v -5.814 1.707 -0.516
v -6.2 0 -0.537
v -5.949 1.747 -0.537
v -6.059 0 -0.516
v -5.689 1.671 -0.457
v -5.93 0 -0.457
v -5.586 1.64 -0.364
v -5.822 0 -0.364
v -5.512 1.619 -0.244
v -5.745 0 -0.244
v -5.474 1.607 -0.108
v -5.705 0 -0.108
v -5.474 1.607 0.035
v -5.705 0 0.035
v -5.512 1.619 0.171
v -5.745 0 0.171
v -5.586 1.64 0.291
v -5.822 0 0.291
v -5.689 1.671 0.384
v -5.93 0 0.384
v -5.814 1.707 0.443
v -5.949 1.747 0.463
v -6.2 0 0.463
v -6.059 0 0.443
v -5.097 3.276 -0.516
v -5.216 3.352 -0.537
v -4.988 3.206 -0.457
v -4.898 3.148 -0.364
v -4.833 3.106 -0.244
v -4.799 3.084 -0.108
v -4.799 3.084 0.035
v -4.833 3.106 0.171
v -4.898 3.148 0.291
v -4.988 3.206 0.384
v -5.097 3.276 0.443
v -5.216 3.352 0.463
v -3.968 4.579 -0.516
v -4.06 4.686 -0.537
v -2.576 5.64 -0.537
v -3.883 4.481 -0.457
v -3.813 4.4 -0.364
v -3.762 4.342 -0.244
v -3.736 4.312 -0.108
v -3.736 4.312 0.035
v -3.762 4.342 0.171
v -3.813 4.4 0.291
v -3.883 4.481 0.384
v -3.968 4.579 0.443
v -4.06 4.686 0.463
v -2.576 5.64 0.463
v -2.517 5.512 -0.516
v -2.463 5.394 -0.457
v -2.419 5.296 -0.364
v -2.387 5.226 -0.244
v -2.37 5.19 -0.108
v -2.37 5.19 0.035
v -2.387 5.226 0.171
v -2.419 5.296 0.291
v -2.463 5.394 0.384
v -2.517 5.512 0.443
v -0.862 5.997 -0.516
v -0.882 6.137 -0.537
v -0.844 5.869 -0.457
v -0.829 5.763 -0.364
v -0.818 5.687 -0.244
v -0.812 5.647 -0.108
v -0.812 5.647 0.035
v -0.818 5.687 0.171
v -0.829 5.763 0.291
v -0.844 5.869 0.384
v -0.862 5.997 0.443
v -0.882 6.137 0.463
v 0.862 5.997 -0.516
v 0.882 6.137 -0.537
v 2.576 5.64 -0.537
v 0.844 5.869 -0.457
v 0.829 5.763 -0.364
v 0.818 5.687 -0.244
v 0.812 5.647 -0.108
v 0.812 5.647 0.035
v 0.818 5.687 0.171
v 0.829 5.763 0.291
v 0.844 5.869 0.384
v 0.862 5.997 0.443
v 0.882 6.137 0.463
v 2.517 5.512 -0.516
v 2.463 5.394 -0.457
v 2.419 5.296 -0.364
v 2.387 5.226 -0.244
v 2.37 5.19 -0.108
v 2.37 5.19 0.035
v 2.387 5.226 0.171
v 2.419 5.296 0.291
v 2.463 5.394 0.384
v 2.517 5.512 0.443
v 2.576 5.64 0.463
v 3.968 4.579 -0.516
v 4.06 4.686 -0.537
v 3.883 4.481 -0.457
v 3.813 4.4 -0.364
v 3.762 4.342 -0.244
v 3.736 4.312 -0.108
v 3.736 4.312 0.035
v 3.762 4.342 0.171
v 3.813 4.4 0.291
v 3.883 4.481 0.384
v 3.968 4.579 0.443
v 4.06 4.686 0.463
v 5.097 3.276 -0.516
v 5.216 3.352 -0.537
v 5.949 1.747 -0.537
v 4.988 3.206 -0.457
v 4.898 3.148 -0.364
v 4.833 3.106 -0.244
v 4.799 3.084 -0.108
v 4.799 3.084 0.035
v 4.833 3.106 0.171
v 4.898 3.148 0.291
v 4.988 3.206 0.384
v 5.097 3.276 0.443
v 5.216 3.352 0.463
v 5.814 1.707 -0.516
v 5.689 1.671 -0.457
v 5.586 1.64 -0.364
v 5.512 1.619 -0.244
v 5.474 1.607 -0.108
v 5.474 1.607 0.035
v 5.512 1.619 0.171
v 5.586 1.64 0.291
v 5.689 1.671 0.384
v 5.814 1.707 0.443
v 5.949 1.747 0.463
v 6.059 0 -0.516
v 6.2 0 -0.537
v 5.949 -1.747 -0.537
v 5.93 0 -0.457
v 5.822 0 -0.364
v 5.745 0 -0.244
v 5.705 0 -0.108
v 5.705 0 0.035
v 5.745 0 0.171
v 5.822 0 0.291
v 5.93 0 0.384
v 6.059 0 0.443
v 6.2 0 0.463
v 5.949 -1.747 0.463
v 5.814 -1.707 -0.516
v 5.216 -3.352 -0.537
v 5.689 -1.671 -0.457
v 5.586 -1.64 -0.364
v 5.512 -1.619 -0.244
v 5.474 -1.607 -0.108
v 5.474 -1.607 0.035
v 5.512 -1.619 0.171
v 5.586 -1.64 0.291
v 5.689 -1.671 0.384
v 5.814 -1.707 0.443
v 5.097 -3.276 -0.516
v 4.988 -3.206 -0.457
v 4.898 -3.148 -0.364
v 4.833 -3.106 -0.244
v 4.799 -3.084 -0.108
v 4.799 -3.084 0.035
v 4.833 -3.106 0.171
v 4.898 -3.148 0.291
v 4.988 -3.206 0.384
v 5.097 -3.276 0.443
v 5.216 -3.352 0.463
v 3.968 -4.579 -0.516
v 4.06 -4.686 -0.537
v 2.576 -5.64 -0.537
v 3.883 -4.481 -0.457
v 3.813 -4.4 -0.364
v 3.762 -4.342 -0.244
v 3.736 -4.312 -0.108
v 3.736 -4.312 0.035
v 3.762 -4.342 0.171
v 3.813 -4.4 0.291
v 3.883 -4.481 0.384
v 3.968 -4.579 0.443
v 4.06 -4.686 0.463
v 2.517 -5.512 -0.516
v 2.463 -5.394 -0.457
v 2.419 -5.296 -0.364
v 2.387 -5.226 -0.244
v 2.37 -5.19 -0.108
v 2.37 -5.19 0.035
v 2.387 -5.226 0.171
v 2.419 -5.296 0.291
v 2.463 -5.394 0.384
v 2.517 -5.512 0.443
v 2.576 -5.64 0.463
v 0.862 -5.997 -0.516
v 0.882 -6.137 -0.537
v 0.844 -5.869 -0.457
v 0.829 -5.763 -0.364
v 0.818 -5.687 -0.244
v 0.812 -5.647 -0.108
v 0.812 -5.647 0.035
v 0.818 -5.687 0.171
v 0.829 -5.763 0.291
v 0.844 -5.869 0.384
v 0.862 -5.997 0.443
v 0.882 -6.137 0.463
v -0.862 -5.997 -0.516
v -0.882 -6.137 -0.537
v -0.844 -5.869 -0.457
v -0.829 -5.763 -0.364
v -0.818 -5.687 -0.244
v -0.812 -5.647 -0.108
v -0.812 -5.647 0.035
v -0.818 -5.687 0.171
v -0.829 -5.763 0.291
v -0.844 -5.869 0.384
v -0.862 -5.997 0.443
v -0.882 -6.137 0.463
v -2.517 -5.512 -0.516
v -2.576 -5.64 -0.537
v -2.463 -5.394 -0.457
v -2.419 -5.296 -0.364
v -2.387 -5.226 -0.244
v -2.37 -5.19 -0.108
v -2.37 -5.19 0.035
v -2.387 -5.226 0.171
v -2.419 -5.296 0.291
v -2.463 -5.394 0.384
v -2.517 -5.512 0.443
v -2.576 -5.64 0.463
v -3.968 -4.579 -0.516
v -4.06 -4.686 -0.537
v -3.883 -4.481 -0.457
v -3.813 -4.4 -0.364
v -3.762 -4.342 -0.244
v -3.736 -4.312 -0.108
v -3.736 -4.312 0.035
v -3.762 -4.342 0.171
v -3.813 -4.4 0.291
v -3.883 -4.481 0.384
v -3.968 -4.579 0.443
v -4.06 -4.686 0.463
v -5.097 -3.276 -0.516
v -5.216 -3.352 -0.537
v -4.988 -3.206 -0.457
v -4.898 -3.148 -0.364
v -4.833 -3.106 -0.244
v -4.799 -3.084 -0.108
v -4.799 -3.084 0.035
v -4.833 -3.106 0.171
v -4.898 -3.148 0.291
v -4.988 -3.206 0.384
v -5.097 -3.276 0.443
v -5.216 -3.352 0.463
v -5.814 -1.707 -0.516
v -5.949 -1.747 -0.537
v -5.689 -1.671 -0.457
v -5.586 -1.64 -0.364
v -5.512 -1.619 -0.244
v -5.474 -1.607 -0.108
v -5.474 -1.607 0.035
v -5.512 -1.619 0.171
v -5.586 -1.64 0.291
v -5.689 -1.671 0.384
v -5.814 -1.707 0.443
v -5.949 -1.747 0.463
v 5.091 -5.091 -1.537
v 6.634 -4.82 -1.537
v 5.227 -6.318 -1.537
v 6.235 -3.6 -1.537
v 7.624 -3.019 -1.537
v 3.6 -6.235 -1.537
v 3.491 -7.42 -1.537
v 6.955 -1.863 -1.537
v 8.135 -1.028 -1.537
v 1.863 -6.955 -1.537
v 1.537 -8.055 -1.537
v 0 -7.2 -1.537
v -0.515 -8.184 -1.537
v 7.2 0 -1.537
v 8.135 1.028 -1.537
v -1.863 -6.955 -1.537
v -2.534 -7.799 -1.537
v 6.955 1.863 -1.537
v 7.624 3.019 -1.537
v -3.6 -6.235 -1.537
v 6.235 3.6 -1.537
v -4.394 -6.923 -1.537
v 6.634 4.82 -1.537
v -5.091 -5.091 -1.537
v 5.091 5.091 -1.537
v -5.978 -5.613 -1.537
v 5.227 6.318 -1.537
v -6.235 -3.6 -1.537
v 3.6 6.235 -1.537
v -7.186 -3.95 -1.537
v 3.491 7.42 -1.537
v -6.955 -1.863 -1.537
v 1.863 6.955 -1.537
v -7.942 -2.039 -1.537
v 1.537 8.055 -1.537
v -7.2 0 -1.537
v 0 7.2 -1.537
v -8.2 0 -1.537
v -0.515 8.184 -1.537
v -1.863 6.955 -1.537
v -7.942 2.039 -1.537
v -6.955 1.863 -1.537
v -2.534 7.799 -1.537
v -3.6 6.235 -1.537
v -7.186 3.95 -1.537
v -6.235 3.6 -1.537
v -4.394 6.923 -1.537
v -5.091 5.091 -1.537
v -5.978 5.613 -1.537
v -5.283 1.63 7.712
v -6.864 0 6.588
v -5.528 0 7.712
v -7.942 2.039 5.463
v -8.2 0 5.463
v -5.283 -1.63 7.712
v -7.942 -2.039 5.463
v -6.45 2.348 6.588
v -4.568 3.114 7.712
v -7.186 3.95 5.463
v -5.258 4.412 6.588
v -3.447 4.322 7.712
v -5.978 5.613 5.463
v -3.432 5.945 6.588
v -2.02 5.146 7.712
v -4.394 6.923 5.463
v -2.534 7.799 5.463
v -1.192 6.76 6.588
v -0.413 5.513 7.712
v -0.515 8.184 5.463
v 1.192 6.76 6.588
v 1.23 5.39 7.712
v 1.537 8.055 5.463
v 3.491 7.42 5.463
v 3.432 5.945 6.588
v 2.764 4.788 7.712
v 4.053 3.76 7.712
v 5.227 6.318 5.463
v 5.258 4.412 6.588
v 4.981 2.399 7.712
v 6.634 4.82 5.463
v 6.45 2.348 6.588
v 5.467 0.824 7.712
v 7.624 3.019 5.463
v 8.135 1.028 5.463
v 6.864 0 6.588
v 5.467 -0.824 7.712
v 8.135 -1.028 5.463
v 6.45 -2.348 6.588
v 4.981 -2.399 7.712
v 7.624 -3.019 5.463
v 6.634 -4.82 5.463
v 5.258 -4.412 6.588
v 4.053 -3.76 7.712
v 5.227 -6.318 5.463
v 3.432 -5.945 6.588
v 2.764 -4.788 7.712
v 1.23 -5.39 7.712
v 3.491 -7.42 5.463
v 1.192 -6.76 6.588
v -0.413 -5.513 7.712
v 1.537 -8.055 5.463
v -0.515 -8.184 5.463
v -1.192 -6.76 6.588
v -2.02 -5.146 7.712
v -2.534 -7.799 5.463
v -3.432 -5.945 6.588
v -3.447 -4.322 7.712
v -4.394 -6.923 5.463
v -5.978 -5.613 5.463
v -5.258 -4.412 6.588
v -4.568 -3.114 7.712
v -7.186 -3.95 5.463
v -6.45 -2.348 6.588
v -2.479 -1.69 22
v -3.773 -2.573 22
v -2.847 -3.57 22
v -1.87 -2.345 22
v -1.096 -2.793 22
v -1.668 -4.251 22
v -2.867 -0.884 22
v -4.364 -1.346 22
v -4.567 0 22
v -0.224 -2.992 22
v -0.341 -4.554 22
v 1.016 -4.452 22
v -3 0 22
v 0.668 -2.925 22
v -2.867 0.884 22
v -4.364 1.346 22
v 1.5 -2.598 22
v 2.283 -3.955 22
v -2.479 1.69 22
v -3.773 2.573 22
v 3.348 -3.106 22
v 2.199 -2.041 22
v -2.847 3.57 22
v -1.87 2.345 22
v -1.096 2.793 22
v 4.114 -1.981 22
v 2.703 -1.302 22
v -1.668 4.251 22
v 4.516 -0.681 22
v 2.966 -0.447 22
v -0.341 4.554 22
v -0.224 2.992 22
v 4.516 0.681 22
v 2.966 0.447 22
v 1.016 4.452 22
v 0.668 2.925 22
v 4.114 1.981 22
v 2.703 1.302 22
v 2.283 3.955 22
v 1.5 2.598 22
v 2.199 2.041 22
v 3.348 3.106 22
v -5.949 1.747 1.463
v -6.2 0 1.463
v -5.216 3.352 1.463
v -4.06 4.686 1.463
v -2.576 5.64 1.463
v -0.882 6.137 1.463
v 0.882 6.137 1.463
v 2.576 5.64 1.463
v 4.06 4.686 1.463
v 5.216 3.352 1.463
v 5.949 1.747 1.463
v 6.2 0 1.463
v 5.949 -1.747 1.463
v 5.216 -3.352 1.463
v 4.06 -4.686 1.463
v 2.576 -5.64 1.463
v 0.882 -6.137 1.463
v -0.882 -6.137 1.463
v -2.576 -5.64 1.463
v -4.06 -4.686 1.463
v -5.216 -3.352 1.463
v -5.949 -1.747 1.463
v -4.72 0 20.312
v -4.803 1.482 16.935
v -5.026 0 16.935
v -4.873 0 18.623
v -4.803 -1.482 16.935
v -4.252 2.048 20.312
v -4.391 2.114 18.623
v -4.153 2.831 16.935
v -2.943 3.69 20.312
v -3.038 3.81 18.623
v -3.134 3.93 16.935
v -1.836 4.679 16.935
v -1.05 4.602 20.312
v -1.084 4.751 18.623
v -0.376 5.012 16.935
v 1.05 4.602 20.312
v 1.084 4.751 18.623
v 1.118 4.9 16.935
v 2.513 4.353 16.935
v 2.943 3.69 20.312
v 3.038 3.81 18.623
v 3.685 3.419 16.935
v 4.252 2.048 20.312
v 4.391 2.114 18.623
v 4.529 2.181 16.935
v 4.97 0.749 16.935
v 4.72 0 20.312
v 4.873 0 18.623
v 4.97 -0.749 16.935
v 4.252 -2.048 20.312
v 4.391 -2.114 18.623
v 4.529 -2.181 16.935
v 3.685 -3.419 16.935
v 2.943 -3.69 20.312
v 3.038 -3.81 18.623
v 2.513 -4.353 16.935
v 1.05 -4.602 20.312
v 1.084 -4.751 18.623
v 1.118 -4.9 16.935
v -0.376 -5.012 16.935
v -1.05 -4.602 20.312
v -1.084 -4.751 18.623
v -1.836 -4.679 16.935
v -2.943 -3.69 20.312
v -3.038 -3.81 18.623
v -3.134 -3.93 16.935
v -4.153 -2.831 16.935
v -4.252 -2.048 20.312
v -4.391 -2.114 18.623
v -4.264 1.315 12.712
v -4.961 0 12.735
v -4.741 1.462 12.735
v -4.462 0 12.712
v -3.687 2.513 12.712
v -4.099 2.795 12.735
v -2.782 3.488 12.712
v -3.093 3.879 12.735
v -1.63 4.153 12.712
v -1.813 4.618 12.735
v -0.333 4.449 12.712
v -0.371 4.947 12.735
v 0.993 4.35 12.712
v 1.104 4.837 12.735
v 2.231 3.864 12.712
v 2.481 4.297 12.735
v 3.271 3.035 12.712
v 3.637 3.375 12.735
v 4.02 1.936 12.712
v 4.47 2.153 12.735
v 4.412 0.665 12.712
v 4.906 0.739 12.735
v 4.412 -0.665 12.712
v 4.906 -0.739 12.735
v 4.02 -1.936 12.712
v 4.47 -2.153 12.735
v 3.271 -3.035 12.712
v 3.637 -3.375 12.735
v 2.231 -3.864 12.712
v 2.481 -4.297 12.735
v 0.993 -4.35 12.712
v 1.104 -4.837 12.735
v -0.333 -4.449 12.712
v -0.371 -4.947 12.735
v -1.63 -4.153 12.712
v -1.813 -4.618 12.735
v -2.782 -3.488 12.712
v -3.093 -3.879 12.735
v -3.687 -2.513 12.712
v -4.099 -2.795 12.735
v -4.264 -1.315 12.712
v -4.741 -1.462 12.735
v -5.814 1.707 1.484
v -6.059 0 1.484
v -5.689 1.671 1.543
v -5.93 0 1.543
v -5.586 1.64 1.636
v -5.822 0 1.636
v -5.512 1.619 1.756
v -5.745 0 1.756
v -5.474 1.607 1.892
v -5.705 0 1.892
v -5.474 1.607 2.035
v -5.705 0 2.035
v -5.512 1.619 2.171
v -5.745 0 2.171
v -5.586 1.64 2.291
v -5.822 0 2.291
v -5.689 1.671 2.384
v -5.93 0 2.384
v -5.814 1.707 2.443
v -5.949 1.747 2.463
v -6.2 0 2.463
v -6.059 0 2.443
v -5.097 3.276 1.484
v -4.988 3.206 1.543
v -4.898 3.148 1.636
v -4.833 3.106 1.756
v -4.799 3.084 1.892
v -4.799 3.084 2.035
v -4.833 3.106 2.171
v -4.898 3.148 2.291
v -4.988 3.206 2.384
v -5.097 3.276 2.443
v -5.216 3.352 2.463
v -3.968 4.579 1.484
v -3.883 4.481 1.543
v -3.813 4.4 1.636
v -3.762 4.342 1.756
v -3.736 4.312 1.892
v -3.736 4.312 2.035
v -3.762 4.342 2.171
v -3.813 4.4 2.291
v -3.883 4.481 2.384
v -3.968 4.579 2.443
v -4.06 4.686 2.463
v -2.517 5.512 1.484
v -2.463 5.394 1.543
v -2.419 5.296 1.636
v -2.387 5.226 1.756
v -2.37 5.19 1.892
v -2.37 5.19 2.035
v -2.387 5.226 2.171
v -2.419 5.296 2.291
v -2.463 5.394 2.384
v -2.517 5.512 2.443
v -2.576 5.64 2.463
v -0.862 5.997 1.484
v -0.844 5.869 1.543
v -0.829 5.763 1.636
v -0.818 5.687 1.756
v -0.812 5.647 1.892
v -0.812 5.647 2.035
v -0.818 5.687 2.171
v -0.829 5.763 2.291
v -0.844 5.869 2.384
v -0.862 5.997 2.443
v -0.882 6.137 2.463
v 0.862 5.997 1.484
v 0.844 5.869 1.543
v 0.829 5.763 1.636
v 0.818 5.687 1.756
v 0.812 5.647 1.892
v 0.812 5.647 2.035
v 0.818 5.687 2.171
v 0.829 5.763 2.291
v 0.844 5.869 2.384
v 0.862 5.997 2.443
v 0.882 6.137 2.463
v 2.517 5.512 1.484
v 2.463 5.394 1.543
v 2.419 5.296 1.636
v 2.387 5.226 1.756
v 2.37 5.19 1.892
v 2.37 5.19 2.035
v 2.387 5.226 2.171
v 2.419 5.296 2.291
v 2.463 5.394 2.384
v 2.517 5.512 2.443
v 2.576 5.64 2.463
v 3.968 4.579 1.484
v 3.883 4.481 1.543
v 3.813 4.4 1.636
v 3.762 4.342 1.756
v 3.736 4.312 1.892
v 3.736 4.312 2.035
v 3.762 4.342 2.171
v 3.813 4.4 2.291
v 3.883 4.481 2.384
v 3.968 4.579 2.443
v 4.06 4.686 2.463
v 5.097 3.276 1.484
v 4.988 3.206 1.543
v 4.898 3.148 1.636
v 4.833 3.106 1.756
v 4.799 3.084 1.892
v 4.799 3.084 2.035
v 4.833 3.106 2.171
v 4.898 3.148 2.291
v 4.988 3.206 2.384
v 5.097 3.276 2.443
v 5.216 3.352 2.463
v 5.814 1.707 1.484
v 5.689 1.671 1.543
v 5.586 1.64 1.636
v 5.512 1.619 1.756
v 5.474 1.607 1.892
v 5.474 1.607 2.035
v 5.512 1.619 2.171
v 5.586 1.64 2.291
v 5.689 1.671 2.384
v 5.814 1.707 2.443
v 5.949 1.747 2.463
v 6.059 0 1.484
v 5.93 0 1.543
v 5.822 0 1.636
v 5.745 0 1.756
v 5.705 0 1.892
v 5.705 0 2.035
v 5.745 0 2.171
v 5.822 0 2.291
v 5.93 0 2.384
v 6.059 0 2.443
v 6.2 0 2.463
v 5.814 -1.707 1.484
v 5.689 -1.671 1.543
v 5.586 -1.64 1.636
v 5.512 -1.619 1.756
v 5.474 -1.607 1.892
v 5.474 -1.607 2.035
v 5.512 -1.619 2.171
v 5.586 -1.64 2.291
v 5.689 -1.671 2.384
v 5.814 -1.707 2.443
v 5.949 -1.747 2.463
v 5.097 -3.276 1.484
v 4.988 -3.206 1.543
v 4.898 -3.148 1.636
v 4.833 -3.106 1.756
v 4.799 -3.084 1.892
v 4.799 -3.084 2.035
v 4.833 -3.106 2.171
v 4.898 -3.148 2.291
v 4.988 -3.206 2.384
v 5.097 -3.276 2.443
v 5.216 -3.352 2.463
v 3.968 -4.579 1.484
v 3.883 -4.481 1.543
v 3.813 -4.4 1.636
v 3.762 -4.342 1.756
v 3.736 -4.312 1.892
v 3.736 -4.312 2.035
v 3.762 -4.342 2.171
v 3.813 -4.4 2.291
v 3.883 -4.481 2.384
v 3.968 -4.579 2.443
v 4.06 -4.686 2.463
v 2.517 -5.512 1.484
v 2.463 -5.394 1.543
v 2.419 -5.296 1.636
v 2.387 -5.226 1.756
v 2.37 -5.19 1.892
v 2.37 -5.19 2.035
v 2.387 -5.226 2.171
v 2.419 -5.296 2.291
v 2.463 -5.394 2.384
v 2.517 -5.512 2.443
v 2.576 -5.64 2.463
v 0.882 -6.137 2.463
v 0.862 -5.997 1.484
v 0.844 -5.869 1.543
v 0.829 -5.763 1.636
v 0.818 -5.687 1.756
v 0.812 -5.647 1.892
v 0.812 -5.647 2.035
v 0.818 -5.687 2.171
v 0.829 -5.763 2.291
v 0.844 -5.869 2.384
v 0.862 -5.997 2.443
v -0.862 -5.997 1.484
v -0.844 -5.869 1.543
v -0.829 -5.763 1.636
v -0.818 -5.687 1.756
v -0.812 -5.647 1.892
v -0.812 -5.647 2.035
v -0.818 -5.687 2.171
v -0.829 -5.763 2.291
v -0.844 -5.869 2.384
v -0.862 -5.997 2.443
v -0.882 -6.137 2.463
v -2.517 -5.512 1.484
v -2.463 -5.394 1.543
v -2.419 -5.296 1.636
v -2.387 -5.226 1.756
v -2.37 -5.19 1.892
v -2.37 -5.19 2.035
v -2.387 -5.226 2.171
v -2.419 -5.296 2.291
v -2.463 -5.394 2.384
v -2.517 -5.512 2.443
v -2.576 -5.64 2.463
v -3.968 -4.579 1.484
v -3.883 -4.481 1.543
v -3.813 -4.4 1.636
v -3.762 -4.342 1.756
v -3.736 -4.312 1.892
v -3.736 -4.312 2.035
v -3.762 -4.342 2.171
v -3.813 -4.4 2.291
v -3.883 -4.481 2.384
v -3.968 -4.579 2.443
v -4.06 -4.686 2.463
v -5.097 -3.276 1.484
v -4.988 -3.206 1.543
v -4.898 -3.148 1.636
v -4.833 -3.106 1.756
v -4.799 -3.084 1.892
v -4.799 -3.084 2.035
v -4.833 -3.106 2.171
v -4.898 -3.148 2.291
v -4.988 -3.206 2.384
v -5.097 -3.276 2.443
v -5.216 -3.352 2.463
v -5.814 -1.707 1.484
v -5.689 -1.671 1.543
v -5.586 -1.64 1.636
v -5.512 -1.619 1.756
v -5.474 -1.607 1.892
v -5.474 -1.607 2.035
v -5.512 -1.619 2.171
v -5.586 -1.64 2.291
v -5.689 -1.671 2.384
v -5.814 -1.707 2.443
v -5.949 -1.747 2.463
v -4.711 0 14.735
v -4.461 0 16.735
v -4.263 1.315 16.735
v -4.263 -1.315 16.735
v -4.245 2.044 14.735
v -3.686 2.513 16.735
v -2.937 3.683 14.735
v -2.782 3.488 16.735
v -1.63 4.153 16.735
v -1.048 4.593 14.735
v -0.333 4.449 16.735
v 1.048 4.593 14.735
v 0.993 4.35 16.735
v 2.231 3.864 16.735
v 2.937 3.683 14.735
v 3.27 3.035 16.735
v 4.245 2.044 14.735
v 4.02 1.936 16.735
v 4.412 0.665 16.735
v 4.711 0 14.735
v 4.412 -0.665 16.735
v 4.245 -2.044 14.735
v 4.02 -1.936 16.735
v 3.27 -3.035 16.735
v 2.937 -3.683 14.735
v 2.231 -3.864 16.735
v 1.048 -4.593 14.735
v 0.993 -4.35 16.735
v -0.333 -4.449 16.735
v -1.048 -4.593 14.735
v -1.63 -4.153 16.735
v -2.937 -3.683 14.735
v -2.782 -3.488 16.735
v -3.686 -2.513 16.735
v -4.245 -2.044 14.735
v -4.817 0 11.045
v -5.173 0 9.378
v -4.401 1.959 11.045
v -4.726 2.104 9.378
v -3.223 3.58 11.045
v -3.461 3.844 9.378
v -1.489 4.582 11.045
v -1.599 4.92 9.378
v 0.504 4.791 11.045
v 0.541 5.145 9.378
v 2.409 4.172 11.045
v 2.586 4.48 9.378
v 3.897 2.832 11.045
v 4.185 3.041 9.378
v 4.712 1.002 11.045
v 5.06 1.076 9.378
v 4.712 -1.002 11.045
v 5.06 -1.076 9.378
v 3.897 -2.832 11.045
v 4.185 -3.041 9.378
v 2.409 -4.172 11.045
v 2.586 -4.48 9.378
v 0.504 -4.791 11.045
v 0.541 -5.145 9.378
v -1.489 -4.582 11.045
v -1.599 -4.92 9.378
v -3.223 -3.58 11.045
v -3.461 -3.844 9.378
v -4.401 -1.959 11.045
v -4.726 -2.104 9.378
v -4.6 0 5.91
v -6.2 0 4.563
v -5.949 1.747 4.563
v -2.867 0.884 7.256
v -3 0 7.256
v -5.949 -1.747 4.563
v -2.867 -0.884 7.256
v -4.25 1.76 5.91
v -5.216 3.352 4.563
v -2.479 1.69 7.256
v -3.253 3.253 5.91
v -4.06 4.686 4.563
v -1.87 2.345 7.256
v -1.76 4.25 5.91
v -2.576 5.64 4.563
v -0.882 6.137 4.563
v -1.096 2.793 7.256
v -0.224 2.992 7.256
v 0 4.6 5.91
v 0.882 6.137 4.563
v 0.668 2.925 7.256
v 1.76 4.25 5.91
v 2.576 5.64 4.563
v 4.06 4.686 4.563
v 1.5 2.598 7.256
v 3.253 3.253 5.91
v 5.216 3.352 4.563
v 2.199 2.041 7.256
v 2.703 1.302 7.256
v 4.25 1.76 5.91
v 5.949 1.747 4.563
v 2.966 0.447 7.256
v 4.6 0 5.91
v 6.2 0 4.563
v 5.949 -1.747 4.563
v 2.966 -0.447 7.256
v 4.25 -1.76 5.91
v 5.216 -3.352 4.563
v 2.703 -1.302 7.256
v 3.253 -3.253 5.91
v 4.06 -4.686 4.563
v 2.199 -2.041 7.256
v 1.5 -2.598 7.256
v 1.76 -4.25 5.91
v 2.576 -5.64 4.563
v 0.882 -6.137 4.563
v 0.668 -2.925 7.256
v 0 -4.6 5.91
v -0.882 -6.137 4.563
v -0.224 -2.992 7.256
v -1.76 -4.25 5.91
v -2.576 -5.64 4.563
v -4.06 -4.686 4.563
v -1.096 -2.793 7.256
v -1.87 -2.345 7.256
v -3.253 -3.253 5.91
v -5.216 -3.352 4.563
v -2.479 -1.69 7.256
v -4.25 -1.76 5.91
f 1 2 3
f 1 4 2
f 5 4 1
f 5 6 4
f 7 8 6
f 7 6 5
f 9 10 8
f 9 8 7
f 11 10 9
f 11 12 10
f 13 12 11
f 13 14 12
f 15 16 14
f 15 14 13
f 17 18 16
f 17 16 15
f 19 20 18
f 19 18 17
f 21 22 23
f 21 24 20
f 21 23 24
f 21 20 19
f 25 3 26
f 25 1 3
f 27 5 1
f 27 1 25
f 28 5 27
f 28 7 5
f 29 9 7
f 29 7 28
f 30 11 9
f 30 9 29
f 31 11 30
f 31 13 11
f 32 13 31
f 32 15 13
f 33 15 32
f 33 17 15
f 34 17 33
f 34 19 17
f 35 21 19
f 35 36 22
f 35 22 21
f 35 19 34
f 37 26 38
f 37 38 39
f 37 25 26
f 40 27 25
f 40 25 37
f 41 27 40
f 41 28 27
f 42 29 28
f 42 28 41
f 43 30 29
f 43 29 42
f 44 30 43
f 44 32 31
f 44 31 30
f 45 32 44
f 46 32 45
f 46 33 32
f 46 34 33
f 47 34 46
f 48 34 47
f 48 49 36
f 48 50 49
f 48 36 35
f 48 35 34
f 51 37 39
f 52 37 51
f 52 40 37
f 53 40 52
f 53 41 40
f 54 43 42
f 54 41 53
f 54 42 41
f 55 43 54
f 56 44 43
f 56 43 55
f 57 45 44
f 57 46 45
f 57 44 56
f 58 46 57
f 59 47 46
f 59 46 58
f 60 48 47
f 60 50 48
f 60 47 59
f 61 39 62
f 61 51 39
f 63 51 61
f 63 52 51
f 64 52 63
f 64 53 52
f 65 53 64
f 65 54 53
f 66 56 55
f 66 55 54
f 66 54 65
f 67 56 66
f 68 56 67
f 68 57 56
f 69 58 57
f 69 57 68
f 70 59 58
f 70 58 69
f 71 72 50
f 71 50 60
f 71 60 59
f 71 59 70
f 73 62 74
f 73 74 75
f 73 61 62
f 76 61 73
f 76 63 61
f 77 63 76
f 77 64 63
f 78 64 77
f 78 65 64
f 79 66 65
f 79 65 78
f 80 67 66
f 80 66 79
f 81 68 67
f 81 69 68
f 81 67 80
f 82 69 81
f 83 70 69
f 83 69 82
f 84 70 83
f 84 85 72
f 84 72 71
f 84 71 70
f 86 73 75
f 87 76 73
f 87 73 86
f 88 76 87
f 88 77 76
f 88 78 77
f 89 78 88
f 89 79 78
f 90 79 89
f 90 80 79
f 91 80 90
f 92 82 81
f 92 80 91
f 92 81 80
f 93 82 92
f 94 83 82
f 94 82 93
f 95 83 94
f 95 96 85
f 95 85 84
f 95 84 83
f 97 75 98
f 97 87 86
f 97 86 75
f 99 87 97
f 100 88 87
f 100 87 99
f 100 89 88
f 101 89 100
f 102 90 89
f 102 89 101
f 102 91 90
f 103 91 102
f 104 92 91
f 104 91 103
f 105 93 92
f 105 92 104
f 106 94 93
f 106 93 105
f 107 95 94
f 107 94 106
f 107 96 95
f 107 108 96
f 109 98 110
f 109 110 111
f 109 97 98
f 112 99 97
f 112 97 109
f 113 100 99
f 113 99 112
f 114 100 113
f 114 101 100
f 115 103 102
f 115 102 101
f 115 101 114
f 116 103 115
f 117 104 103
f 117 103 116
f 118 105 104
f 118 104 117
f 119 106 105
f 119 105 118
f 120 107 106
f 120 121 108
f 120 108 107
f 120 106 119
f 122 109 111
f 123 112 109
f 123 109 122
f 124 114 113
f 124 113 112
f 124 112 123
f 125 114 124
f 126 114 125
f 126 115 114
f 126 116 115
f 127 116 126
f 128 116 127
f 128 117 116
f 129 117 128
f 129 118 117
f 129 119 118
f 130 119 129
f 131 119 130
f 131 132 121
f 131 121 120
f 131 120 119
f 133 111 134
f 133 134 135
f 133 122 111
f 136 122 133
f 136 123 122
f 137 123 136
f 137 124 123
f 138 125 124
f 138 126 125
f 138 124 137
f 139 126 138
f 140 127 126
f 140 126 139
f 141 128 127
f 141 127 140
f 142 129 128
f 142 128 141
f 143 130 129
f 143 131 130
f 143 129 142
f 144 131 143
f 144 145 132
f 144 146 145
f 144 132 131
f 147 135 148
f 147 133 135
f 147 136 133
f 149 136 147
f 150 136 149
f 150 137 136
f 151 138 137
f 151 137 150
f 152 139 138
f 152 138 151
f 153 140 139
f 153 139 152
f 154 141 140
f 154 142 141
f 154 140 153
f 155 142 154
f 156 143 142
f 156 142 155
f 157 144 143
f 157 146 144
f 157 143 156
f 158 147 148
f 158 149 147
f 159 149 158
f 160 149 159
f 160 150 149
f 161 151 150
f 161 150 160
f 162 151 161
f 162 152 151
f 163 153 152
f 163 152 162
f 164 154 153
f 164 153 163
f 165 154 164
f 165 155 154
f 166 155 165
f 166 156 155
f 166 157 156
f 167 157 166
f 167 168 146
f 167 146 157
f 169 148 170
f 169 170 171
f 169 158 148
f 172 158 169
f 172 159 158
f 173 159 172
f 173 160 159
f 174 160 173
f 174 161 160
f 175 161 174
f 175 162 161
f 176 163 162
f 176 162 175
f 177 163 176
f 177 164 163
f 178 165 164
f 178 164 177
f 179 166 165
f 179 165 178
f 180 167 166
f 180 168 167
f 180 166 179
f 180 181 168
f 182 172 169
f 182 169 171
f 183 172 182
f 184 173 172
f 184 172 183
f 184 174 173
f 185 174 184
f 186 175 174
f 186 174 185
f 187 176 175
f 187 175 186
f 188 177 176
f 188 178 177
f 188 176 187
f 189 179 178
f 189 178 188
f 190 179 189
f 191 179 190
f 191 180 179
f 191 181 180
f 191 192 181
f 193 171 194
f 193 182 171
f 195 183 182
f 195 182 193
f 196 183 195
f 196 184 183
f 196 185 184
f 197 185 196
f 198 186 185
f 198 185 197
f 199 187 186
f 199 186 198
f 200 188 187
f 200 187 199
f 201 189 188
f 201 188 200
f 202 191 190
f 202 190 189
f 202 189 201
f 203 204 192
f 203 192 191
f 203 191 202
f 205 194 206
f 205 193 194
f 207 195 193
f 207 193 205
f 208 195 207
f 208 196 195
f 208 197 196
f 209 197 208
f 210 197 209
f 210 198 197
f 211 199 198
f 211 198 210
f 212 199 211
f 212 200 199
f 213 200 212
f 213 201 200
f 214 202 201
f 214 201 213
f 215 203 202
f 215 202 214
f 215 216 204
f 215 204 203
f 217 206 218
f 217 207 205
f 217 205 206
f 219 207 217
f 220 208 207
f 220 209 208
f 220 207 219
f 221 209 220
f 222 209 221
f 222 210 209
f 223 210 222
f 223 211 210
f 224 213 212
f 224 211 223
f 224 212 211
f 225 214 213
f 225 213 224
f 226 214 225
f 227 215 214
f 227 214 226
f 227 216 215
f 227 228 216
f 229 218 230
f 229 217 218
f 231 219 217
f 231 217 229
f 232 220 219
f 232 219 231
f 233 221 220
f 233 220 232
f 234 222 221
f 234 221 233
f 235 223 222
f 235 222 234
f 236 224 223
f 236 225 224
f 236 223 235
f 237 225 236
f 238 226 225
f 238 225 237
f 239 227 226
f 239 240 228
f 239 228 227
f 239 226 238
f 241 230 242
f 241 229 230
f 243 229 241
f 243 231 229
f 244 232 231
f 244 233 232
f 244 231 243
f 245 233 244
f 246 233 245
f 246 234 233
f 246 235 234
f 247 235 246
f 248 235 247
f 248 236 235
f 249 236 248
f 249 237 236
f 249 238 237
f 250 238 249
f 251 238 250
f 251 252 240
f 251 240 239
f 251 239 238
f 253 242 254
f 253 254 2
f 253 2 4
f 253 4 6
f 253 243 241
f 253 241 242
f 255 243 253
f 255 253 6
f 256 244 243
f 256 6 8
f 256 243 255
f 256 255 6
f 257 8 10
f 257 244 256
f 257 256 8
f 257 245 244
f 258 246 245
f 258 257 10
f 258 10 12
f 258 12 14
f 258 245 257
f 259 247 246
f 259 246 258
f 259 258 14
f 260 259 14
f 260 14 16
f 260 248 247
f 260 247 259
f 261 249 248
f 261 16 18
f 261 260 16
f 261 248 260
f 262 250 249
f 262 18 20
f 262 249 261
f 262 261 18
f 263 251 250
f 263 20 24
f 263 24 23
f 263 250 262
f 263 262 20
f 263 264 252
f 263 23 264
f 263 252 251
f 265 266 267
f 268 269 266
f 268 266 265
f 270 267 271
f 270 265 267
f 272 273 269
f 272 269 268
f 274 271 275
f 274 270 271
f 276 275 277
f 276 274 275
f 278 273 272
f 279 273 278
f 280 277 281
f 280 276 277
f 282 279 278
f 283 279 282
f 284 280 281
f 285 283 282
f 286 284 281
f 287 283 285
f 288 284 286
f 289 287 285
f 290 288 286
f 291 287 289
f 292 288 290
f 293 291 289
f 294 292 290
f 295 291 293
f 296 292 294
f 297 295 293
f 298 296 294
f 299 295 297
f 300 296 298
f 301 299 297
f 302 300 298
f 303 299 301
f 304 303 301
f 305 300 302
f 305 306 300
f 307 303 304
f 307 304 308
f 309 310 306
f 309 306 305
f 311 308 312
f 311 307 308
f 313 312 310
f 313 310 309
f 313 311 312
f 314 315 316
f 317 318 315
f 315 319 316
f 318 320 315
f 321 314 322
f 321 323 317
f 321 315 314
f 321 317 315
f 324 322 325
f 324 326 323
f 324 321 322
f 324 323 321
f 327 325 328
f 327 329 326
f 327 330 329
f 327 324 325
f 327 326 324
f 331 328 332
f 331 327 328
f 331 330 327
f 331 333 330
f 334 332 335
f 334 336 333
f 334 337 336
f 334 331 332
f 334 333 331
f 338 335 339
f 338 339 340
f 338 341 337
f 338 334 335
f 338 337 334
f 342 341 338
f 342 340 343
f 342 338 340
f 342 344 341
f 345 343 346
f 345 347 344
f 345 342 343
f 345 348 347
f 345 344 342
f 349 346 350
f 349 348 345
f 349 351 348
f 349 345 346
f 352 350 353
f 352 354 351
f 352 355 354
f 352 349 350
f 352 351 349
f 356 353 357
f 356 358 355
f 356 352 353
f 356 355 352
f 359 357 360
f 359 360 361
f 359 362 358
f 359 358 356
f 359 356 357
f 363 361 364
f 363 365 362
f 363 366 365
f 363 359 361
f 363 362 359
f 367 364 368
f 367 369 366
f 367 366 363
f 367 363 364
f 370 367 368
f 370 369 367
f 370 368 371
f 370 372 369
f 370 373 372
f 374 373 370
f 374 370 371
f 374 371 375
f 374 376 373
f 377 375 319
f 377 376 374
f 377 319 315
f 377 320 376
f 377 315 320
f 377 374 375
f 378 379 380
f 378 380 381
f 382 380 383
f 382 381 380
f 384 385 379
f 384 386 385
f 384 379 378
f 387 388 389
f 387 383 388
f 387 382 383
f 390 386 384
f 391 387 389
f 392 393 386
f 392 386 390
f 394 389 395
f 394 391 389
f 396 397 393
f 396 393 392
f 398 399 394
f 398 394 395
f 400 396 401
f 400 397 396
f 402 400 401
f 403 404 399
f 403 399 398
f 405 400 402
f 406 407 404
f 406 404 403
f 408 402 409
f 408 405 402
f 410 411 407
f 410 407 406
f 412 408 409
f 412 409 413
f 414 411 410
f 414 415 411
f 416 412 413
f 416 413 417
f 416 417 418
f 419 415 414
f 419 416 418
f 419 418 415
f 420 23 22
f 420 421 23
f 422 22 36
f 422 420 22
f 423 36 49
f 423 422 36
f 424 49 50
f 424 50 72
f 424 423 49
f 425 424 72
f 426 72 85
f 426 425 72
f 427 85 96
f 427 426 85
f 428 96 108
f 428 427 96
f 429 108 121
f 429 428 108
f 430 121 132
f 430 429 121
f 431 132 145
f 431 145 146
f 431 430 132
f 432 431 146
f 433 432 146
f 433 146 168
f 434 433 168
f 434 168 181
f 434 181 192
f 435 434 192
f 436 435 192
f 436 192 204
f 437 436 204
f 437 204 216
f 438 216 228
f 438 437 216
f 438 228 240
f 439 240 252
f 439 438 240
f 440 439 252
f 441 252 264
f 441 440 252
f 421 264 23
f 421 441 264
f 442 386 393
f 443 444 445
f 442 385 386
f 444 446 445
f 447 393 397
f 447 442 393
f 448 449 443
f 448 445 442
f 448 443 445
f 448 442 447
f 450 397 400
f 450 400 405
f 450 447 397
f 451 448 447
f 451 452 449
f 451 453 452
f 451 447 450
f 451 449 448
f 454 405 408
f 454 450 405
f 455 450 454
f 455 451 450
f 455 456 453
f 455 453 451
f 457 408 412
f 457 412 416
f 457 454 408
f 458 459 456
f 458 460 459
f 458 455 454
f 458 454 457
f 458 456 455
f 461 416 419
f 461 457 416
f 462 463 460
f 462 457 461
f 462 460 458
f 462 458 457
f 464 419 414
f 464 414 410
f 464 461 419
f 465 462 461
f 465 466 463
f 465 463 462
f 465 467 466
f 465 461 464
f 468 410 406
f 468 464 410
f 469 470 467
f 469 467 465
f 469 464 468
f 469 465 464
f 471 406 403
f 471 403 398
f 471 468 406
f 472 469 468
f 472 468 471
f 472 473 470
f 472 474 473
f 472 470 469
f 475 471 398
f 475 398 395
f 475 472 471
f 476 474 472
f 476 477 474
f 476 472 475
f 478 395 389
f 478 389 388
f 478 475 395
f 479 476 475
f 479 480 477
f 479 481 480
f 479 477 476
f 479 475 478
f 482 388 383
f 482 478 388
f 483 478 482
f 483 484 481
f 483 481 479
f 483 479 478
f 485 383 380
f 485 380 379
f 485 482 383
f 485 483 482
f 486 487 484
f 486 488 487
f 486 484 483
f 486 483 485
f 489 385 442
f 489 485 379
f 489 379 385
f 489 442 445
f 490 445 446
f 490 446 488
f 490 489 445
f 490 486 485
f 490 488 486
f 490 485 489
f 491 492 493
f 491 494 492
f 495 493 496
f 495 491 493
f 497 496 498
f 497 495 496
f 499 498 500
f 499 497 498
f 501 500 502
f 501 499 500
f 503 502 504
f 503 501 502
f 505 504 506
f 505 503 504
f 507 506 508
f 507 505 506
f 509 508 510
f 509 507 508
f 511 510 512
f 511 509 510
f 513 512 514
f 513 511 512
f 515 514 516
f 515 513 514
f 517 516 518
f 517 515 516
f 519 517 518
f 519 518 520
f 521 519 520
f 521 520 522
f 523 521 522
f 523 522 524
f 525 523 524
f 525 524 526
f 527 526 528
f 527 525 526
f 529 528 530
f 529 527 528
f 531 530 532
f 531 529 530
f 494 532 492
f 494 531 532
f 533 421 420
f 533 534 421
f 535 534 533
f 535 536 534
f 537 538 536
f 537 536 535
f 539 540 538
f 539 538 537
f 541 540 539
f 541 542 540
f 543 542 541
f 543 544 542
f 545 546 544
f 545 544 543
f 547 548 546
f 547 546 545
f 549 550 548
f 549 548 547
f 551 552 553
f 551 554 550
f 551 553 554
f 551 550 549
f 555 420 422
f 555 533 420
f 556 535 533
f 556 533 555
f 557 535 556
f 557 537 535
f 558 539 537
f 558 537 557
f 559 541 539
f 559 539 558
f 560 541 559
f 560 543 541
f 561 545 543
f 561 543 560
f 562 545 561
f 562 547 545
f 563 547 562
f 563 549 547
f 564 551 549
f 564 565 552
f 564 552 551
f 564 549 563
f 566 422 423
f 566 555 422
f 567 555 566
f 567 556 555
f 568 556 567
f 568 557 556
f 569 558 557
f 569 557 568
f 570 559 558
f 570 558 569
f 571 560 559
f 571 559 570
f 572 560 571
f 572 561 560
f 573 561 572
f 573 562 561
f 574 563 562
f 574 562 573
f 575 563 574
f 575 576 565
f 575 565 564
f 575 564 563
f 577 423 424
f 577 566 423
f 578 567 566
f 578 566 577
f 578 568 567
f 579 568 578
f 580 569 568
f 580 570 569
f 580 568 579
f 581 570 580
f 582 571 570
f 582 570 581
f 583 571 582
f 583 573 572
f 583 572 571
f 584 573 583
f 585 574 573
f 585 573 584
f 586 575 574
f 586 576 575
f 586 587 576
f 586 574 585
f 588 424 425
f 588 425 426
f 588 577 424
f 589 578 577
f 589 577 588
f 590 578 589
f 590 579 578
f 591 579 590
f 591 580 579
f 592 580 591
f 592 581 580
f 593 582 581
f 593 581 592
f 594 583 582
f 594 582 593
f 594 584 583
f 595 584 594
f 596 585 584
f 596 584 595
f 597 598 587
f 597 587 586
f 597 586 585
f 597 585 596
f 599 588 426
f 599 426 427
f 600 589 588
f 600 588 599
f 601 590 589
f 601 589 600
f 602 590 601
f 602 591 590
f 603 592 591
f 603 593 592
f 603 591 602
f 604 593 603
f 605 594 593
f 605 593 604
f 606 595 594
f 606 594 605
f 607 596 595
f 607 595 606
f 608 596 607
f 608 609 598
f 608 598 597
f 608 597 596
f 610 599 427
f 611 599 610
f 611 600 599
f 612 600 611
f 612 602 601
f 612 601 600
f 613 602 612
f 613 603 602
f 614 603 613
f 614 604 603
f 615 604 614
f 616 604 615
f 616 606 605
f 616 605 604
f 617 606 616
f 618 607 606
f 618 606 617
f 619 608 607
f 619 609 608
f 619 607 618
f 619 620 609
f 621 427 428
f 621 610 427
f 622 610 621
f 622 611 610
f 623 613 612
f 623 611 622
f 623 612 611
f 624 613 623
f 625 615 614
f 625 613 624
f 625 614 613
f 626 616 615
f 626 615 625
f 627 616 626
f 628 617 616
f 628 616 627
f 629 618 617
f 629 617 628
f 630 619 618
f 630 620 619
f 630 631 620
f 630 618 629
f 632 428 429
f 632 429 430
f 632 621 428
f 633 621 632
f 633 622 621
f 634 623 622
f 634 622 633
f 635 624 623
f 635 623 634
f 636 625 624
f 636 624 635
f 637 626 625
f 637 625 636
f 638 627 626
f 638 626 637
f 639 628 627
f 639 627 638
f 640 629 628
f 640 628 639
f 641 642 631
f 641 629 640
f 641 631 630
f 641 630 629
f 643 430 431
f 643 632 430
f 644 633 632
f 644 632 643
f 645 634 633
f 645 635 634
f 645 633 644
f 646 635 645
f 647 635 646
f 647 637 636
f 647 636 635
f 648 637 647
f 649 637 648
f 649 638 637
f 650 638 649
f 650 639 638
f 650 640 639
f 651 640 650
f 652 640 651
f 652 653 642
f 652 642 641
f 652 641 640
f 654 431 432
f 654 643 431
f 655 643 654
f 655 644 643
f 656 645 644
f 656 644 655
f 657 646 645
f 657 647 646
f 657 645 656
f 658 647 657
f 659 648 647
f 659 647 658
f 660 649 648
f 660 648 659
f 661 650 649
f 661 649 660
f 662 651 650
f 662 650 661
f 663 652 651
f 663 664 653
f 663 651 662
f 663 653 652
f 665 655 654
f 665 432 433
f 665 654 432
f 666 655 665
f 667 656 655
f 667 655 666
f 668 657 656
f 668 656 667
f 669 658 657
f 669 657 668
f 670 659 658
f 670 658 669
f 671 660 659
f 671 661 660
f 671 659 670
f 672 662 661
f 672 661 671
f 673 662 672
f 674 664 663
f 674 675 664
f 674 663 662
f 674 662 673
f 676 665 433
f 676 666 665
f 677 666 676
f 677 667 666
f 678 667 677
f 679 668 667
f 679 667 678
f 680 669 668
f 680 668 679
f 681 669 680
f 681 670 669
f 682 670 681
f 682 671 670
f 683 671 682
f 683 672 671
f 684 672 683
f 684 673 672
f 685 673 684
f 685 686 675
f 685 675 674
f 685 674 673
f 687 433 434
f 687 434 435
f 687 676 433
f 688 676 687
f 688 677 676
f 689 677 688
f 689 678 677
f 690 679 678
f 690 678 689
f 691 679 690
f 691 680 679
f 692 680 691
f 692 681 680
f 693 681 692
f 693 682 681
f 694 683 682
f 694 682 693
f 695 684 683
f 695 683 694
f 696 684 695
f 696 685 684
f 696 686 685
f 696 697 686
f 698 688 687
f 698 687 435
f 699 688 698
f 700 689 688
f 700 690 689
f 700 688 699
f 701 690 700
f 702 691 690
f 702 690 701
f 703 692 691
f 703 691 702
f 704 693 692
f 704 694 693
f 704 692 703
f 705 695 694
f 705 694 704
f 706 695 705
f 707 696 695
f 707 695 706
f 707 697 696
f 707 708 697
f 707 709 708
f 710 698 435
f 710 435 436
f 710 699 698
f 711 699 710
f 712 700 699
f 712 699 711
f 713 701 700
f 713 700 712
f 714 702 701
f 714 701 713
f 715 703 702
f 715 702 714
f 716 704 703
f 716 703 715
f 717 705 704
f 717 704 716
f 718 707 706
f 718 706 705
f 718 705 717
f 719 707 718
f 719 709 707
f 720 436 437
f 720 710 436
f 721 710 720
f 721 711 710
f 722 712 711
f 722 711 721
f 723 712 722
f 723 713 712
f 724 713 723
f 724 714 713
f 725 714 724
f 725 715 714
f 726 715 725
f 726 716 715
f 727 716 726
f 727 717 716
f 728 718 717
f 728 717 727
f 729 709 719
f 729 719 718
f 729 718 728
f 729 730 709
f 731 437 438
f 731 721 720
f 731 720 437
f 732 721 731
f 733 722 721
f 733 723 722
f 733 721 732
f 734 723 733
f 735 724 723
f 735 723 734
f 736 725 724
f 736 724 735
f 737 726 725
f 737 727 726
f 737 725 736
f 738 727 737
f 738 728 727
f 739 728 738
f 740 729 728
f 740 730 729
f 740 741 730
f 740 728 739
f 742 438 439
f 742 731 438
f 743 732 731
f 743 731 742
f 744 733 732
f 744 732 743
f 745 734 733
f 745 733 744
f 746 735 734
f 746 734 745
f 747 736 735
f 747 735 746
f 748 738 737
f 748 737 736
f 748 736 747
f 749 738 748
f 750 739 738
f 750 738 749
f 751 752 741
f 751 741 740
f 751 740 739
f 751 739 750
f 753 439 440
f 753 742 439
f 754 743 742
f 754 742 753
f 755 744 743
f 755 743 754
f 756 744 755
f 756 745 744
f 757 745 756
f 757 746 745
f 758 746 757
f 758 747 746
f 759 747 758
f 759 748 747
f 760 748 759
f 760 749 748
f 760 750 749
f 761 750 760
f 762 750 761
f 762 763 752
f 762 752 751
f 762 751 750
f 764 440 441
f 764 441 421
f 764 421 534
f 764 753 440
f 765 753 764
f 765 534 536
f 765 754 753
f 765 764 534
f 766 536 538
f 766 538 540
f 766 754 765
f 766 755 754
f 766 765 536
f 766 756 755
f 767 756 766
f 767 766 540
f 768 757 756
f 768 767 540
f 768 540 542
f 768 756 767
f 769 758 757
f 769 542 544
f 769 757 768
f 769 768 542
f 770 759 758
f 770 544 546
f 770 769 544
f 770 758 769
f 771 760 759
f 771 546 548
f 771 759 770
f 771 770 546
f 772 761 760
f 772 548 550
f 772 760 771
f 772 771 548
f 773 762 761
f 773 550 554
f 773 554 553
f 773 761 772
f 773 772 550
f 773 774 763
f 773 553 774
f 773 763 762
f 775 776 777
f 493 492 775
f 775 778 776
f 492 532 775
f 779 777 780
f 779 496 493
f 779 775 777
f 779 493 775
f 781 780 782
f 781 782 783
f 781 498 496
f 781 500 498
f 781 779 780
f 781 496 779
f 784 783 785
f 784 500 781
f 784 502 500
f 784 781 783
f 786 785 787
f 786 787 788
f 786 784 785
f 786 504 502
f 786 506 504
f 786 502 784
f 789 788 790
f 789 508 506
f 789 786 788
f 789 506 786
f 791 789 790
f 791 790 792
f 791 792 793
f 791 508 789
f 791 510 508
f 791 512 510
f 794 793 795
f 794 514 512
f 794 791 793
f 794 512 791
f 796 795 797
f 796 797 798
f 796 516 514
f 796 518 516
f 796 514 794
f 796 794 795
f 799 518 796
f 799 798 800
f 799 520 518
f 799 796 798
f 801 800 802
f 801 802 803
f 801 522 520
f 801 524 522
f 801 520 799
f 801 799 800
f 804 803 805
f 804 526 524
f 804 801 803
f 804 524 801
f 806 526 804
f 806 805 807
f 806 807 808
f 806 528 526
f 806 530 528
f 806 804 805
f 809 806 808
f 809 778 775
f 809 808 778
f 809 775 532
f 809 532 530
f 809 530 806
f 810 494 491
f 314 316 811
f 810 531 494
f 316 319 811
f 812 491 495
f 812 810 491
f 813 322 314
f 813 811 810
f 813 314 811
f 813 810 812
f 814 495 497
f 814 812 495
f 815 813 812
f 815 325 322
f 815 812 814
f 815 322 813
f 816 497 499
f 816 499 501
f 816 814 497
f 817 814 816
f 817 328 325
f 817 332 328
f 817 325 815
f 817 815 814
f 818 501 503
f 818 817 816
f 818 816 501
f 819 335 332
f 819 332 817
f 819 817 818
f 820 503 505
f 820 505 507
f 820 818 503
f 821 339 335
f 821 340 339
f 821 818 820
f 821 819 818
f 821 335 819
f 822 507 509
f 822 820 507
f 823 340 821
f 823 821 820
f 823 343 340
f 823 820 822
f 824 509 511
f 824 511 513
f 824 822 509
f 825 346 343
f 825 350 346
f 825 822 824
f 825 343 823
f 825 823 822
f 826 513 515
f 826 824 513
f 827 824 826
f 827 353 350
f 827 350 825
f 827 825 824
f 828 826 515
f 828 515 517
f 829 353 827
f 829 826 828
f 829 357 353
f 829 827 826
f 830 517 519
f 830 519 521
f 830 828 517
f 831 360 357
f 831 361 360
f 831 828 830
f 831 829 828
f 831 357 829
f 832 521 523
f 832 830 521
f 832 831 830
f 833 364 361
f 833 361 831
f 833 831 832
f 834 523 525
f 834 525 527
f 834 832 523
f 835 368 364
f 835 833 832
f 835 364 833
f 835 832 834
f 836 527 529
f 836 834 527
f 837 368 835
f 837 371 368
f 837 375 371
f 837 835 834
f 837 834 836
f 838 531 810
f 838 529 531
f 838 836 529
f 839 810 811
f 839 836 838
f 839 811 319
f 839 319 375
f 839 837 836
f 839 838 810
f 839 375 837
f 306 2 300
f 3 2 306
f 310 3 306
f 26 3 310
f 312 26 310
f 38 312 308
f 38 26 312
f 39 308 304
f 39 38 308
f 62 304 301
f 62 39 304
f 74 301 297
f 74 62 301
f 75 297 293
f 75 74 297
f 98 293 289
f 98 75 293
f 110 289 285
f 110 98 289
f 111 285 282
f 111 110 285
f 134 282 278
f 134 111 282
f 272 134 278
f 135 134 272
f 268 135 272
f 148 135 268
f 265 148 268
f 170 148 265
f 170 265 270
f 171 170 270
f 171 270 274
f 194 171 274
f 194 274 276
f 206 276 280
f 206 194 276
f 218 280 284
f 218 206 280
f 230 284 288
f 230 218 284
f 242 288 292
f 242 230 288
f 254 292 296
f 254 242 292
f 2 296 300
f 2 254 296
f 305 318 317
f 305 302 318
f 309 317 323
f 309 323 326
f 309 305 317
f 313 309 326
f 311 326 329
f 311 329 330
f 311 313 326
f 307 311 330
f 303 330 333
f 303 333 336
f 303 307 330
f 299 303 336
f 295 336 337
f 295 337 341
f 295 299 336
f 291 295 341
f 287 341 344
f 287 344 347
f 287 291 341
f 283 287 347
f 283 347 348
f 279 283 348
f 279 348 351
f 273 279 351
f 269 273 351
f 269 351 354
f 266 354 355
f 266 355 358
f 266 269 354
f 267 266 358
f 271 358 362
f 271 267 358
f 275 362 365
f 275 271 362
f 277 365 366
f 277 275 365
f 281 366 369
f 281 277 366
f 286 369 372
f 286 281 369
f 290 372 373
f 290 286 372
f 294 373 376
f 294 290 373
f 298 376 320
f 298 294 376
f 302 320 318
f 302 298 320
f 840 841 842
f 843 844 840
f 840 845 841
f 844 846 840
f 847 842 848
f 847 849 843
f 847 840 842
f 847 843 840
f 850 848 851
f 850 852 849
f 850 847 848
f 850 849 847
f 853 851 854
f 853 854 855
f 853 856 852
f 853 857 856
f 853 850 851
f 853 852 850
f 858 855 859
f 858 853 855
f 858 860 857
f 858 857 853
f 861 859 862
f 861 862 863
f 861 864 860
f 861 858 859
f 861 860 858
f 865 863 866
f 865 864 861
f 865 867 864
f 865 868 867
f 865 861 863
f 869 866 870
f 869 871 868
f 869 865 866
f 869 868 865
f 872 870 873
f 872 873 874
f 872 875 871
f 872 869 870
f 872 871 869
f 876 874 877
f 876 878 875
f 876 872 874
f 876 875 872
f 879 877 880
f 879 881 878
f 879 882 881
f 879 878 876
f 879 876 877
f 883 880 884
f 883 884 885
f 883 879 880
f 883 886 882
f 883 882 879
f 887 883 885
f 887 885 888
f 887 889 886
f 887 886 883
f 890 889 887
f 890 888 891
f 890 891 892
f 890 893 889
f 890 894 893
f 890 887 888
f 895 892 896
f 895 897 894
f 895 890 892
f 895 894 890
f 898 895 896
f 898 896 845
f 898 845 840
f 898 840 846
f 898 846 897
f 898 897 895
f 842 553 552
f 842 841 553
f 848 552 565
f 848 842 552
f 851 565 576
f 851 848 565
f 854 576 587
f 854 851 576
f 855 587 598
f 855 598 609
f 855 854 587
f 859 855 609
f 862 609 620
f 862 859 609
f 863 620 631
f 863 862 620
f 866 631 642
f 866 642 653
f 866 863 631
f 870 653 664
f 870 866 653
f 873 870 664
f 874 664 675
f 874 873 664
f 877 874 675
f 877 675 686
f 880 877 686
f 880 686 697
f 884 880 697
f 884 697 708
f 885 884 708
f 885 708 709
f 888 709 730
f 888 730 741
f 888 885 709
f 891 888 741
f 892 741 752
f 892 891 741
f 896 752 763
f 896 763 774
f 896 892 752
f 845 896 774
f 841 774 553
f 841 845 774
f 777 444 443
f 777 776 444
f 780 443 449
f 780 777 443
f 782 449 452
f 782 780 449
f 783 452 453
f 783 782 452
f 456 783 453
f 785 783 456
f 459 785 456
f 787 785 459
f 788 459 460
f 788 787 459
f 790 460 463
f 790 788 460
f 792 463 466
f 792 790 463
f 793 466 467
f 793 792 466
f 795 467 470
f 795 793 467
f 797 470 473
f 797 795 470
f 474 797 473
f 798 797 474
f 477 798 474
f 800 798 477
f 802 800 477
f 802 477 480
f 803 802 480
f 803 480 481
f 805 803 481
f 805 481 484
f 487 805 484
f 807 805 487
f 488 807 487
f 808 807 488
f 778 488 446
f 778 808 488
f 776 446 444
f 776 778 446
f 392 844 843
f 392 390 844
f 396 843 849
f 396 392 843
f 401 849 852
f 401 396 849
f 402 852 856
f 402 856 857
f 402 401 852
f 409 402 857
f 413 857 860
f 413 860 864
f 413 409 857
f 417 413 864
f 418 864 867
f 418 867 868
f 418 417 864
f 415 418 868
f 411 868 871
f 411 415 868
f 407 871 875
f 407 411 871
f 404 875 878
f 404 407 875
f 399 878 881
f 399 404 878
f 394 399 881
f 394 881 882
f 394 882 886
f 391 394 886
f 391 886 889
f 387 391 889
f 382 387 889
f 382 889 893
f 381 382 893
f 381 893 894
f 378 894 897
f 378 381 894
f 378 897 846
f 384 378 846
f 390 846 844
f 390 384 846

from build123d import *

# Parameters (mm, degrees)
F2_SIZE = 0.99999


# Not quite as in the source:
# - a fillet or chamfer is up to 0.001 mm smaller than in the source, because OpenCascade refuses the exact size


with BuildPart() as f1:
    # F0 (on Front) → F1 (revolve)
    with BuildSketch(Plane.XZ):
        with BuildLine():
            Line((-8.2, -1.5365384456), (-6.2, -1.5365384456))
            Line((-6.2, -1.5365384456), (-6.2, -0.5365384456))
            ThreePointArc((-6.2, -0.5365384456), (-5.7, -0.0365384456), (-6.2, 0.4634615544))
            Line((-6.2, 0.4634615544), (-6.2, 1.4634615544))
            ThreePointArc((-6.2, 1.4634615544), (-5.7, 1.9634615544), (-6.2, 2.4634615544))
            Line((-6.2, 2.4634615544), (-6.2, 4.5634615544))
            Line((-6.2, 4.5634615544), (-3, 7.2563952203))
            Line((-3, 7.2563952203), (-3, 22))
            Line((-3, 22), (-4.566712814, 22))
            Line((-4.566712814, 22), (-5.0262918188, 16.9351019463))
            Line((-5.0262918188, 16.9351019463), (-4.4613682133, 16.7352703944))
            Line((-4.4613682133, 16.7352703944), (-4.9613682133, 12.7352703944))
            Line((-4.9613682133, 12.7352703944), (-4.4619254344, 12.7116714393))
            Line((-4.4619254344, 12.7116714393), (-5.5284631097, 7.7116714393))
            Line((-5.5284631097, 7.7116714393), (-8.2, 5.4634615544))
            Line((-8.2, 5.4634615544), (-8.2, -1.5365384456))
        make_face()
    revolve(axis=Axis((0, 0, 11), (0, 0, -1)))

    # F2 (size 1 in the source; OpenCascade refuses exactly that, so slightly less here)
    f2_edges = [f1.edges().sort_by_distance(p)[0] for p in [
        (6.2, 0, -1.536538),
    ]]
    chamfer(f2_edges, length=F2_SIZE)


solid = f1.part
